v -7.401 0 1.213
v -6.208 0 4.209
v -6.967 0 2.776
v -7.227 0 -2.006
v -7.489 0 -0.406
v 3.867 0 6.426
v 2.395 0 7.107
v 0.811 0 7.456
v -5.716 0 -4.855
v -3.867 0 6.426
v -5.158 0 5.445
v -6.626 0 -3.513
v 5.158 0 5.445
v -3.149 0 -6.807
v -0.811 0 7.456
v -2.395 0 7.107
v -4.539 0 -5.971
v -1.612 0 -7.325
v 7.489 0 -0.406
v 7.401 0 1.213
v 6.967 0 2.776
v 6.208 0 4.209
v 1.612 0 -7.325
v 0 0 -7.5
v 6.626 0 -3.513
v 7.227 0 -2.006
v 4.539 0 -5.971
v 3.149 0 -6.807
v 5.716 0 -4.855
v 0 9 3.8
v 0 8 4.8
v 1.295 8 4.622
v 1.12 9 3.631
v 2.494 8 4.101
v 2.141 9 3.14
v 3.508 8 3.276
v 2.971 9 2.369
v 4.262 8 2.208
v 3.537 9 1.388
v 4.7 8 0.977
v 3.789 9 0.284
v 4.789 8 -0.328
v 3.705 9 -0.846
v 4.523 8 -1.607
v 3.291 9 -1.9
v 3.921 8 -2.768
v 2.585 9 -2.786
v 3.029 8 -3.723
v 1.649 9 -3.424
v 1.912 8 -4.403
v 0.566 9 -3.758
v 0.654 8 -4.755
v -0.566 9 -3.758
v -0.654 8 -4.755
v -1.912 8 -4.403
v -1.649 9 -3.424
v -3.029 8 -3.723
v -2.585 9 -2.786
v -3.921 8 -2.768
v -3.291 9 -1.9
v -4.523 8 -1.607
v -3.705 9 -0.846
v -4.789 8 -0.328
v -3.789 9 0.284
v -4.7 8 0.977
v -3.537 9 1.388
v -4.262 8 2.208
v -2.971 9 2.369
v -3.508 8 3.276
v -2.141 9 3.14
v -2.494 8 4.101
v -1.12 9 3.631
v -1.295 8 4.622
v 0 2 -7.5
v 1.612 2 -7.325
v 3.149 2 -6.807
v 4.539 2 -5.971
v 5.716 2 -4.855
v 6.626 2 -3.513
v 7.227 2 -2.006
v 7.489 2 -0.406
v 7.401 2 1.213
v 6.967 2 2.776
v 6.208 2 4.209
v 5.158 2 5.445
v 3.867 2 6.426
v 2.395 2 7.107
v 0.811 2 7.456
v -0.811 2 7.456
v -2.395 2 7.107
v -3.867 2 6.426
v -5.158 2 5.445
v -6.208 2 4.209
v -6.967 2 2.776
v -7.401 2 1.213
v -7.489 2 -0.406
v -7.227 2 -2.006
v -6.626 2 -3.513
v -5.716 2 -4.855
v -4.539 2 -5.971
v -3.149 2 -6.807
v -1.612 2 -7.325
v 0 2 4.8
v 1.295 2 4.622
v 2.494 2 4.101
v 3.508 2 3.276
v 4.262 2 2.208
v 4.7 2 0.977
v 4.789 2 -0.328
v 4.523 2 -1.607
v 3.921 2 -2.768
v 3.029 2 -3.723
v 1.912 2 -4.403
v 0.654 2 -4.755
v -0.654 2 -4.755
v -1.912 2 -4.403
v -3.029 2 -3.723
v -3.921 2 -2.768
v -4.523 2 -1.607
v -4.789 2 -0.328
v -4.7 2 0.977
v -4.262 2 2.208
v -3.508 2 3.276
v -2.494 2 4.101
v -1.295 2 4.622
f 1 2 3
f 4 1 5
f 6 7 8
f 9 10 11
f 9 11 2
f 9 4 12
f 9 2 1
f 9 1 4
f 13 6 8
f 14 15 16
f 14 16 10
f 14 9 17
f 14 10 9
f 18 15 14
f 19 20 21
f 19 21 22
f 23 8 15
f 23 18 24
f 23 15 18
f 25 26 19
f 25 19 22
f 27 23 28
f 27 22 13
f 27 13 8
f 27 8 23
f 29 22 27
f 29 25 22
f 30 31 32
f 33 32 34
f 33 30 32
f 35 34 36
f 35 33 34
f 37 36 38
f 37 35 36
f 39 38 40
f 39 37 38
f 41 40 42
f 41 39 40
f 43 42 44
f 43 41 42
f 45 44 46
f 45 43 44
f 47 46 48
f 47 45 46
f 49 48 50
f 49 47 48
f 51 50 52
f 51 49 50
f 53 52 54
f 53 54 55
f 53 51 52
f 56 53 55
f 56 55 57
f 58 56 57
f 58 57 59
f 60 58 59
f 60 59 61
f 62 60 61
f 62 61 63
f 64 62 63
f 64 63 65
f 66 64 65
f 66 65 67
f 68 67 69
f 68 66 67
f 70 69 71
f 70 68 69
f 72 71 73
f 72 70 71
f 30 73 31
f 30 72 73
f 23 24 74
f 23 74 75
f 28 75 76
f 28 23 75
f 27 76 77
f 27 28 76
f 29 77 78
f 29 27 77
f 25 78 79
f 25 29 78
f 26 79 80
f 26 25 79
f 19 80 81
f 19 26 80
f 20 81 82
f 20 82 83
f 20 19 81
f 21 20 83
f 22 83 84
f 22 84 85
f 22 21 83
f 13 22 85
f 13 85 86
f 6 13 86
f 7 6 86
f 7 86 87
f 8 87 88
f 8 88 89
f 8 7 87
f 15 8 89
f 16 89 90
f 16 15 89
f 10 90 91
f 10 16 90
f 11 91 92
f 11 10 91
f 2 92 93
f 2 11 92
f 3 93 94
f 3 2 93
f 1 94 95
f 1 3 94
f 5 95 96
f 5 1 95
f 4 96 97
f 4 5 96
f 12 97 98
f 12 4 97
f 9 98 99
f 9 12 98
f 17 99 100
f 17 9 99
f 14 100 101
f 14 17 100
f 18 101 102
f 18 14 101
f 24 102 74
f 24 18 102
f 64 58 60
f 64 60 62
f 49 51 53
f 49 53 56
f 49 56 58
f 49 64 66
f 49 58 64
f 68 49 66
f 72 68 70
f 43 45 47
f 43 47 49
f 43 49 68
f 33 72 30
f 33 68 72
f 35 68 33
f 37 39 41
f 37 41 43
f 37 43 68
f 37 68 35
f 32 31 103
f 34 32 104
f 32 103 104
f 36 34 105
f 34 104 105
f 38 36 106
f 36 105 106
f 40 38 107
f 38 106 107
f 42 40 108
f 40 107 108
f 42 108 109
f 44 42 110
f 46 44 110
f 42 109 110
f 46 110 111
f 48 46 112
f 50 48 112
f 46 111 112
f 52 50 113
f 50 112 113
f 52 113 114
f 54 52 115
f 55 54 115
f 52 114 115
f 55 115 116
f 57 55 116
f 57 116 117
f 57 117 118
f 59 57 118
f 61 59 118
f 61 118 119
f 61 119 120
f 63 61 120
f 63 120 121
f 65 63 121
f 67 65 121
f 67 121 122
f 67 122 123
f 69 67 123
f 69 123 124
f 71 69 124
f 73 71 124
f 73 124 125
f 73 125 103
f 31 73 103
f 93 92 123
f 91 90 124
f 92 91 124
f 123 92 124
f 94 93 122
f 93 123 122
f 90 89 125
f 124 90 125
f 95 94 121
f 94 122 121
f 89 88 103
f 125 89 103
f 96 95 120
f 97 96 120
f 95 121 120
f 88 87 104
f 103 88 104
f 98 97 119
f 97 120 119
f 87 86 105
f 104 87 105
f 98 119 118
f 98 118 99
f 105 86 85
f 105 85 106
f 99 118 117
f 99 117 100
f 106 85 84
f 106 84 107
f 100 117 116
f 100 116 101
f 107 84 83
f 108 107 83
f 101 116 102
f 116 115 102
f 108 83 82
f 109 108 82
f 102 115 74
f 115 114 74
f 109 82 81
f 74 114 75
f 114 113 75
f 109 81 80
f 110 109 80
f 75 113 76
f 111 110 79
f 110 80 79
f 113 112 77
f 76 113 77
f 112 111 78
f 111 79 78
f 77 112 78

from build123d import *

# Parameters (mm, degrees)
SKETCH1_R           = 4.8
BOSS_EXTRUDE1_DEPTH = 9
SKETCH2_R           = 7.5
BOSS_EXTRUDE2_DEPTH = 2
CHAMFER1_SIZE       = 1


with BuildPart() as part:
    # Sketch1 → Boss-Extrude1 (new body)
    with BuildSketch(Plane(origin=(0, 0, 0), x_dir=(1, 0, 0), z_dir=(0, 1, 0))):
        with Locations(Location((0, 0, 0), (0, 0, 270))):
            Circle(SKETCH1_R)
    extrude(amount=BOSS_EXTRUDE1_DEPTH)

    # Sketch2 → Boss-Extrude2 (add)
    with BuildSketch(Plane.XZ):
        with Locations(Location((0, 0, 0), (0, 0, 270))):
            Circle(SKETCH2_R)
    extrude(amount=-BOSS_EXTRUDE2_DEPTH)

    # Chamfer1
    chamfer1_edges = [part.edges().sort_by_distance(p)[0] for p in [
        (0, 9, -4.8),
    ]]
    chamfer(chamfer1_edges, length=CHAMFER1_SIZE)


solid = part.part
